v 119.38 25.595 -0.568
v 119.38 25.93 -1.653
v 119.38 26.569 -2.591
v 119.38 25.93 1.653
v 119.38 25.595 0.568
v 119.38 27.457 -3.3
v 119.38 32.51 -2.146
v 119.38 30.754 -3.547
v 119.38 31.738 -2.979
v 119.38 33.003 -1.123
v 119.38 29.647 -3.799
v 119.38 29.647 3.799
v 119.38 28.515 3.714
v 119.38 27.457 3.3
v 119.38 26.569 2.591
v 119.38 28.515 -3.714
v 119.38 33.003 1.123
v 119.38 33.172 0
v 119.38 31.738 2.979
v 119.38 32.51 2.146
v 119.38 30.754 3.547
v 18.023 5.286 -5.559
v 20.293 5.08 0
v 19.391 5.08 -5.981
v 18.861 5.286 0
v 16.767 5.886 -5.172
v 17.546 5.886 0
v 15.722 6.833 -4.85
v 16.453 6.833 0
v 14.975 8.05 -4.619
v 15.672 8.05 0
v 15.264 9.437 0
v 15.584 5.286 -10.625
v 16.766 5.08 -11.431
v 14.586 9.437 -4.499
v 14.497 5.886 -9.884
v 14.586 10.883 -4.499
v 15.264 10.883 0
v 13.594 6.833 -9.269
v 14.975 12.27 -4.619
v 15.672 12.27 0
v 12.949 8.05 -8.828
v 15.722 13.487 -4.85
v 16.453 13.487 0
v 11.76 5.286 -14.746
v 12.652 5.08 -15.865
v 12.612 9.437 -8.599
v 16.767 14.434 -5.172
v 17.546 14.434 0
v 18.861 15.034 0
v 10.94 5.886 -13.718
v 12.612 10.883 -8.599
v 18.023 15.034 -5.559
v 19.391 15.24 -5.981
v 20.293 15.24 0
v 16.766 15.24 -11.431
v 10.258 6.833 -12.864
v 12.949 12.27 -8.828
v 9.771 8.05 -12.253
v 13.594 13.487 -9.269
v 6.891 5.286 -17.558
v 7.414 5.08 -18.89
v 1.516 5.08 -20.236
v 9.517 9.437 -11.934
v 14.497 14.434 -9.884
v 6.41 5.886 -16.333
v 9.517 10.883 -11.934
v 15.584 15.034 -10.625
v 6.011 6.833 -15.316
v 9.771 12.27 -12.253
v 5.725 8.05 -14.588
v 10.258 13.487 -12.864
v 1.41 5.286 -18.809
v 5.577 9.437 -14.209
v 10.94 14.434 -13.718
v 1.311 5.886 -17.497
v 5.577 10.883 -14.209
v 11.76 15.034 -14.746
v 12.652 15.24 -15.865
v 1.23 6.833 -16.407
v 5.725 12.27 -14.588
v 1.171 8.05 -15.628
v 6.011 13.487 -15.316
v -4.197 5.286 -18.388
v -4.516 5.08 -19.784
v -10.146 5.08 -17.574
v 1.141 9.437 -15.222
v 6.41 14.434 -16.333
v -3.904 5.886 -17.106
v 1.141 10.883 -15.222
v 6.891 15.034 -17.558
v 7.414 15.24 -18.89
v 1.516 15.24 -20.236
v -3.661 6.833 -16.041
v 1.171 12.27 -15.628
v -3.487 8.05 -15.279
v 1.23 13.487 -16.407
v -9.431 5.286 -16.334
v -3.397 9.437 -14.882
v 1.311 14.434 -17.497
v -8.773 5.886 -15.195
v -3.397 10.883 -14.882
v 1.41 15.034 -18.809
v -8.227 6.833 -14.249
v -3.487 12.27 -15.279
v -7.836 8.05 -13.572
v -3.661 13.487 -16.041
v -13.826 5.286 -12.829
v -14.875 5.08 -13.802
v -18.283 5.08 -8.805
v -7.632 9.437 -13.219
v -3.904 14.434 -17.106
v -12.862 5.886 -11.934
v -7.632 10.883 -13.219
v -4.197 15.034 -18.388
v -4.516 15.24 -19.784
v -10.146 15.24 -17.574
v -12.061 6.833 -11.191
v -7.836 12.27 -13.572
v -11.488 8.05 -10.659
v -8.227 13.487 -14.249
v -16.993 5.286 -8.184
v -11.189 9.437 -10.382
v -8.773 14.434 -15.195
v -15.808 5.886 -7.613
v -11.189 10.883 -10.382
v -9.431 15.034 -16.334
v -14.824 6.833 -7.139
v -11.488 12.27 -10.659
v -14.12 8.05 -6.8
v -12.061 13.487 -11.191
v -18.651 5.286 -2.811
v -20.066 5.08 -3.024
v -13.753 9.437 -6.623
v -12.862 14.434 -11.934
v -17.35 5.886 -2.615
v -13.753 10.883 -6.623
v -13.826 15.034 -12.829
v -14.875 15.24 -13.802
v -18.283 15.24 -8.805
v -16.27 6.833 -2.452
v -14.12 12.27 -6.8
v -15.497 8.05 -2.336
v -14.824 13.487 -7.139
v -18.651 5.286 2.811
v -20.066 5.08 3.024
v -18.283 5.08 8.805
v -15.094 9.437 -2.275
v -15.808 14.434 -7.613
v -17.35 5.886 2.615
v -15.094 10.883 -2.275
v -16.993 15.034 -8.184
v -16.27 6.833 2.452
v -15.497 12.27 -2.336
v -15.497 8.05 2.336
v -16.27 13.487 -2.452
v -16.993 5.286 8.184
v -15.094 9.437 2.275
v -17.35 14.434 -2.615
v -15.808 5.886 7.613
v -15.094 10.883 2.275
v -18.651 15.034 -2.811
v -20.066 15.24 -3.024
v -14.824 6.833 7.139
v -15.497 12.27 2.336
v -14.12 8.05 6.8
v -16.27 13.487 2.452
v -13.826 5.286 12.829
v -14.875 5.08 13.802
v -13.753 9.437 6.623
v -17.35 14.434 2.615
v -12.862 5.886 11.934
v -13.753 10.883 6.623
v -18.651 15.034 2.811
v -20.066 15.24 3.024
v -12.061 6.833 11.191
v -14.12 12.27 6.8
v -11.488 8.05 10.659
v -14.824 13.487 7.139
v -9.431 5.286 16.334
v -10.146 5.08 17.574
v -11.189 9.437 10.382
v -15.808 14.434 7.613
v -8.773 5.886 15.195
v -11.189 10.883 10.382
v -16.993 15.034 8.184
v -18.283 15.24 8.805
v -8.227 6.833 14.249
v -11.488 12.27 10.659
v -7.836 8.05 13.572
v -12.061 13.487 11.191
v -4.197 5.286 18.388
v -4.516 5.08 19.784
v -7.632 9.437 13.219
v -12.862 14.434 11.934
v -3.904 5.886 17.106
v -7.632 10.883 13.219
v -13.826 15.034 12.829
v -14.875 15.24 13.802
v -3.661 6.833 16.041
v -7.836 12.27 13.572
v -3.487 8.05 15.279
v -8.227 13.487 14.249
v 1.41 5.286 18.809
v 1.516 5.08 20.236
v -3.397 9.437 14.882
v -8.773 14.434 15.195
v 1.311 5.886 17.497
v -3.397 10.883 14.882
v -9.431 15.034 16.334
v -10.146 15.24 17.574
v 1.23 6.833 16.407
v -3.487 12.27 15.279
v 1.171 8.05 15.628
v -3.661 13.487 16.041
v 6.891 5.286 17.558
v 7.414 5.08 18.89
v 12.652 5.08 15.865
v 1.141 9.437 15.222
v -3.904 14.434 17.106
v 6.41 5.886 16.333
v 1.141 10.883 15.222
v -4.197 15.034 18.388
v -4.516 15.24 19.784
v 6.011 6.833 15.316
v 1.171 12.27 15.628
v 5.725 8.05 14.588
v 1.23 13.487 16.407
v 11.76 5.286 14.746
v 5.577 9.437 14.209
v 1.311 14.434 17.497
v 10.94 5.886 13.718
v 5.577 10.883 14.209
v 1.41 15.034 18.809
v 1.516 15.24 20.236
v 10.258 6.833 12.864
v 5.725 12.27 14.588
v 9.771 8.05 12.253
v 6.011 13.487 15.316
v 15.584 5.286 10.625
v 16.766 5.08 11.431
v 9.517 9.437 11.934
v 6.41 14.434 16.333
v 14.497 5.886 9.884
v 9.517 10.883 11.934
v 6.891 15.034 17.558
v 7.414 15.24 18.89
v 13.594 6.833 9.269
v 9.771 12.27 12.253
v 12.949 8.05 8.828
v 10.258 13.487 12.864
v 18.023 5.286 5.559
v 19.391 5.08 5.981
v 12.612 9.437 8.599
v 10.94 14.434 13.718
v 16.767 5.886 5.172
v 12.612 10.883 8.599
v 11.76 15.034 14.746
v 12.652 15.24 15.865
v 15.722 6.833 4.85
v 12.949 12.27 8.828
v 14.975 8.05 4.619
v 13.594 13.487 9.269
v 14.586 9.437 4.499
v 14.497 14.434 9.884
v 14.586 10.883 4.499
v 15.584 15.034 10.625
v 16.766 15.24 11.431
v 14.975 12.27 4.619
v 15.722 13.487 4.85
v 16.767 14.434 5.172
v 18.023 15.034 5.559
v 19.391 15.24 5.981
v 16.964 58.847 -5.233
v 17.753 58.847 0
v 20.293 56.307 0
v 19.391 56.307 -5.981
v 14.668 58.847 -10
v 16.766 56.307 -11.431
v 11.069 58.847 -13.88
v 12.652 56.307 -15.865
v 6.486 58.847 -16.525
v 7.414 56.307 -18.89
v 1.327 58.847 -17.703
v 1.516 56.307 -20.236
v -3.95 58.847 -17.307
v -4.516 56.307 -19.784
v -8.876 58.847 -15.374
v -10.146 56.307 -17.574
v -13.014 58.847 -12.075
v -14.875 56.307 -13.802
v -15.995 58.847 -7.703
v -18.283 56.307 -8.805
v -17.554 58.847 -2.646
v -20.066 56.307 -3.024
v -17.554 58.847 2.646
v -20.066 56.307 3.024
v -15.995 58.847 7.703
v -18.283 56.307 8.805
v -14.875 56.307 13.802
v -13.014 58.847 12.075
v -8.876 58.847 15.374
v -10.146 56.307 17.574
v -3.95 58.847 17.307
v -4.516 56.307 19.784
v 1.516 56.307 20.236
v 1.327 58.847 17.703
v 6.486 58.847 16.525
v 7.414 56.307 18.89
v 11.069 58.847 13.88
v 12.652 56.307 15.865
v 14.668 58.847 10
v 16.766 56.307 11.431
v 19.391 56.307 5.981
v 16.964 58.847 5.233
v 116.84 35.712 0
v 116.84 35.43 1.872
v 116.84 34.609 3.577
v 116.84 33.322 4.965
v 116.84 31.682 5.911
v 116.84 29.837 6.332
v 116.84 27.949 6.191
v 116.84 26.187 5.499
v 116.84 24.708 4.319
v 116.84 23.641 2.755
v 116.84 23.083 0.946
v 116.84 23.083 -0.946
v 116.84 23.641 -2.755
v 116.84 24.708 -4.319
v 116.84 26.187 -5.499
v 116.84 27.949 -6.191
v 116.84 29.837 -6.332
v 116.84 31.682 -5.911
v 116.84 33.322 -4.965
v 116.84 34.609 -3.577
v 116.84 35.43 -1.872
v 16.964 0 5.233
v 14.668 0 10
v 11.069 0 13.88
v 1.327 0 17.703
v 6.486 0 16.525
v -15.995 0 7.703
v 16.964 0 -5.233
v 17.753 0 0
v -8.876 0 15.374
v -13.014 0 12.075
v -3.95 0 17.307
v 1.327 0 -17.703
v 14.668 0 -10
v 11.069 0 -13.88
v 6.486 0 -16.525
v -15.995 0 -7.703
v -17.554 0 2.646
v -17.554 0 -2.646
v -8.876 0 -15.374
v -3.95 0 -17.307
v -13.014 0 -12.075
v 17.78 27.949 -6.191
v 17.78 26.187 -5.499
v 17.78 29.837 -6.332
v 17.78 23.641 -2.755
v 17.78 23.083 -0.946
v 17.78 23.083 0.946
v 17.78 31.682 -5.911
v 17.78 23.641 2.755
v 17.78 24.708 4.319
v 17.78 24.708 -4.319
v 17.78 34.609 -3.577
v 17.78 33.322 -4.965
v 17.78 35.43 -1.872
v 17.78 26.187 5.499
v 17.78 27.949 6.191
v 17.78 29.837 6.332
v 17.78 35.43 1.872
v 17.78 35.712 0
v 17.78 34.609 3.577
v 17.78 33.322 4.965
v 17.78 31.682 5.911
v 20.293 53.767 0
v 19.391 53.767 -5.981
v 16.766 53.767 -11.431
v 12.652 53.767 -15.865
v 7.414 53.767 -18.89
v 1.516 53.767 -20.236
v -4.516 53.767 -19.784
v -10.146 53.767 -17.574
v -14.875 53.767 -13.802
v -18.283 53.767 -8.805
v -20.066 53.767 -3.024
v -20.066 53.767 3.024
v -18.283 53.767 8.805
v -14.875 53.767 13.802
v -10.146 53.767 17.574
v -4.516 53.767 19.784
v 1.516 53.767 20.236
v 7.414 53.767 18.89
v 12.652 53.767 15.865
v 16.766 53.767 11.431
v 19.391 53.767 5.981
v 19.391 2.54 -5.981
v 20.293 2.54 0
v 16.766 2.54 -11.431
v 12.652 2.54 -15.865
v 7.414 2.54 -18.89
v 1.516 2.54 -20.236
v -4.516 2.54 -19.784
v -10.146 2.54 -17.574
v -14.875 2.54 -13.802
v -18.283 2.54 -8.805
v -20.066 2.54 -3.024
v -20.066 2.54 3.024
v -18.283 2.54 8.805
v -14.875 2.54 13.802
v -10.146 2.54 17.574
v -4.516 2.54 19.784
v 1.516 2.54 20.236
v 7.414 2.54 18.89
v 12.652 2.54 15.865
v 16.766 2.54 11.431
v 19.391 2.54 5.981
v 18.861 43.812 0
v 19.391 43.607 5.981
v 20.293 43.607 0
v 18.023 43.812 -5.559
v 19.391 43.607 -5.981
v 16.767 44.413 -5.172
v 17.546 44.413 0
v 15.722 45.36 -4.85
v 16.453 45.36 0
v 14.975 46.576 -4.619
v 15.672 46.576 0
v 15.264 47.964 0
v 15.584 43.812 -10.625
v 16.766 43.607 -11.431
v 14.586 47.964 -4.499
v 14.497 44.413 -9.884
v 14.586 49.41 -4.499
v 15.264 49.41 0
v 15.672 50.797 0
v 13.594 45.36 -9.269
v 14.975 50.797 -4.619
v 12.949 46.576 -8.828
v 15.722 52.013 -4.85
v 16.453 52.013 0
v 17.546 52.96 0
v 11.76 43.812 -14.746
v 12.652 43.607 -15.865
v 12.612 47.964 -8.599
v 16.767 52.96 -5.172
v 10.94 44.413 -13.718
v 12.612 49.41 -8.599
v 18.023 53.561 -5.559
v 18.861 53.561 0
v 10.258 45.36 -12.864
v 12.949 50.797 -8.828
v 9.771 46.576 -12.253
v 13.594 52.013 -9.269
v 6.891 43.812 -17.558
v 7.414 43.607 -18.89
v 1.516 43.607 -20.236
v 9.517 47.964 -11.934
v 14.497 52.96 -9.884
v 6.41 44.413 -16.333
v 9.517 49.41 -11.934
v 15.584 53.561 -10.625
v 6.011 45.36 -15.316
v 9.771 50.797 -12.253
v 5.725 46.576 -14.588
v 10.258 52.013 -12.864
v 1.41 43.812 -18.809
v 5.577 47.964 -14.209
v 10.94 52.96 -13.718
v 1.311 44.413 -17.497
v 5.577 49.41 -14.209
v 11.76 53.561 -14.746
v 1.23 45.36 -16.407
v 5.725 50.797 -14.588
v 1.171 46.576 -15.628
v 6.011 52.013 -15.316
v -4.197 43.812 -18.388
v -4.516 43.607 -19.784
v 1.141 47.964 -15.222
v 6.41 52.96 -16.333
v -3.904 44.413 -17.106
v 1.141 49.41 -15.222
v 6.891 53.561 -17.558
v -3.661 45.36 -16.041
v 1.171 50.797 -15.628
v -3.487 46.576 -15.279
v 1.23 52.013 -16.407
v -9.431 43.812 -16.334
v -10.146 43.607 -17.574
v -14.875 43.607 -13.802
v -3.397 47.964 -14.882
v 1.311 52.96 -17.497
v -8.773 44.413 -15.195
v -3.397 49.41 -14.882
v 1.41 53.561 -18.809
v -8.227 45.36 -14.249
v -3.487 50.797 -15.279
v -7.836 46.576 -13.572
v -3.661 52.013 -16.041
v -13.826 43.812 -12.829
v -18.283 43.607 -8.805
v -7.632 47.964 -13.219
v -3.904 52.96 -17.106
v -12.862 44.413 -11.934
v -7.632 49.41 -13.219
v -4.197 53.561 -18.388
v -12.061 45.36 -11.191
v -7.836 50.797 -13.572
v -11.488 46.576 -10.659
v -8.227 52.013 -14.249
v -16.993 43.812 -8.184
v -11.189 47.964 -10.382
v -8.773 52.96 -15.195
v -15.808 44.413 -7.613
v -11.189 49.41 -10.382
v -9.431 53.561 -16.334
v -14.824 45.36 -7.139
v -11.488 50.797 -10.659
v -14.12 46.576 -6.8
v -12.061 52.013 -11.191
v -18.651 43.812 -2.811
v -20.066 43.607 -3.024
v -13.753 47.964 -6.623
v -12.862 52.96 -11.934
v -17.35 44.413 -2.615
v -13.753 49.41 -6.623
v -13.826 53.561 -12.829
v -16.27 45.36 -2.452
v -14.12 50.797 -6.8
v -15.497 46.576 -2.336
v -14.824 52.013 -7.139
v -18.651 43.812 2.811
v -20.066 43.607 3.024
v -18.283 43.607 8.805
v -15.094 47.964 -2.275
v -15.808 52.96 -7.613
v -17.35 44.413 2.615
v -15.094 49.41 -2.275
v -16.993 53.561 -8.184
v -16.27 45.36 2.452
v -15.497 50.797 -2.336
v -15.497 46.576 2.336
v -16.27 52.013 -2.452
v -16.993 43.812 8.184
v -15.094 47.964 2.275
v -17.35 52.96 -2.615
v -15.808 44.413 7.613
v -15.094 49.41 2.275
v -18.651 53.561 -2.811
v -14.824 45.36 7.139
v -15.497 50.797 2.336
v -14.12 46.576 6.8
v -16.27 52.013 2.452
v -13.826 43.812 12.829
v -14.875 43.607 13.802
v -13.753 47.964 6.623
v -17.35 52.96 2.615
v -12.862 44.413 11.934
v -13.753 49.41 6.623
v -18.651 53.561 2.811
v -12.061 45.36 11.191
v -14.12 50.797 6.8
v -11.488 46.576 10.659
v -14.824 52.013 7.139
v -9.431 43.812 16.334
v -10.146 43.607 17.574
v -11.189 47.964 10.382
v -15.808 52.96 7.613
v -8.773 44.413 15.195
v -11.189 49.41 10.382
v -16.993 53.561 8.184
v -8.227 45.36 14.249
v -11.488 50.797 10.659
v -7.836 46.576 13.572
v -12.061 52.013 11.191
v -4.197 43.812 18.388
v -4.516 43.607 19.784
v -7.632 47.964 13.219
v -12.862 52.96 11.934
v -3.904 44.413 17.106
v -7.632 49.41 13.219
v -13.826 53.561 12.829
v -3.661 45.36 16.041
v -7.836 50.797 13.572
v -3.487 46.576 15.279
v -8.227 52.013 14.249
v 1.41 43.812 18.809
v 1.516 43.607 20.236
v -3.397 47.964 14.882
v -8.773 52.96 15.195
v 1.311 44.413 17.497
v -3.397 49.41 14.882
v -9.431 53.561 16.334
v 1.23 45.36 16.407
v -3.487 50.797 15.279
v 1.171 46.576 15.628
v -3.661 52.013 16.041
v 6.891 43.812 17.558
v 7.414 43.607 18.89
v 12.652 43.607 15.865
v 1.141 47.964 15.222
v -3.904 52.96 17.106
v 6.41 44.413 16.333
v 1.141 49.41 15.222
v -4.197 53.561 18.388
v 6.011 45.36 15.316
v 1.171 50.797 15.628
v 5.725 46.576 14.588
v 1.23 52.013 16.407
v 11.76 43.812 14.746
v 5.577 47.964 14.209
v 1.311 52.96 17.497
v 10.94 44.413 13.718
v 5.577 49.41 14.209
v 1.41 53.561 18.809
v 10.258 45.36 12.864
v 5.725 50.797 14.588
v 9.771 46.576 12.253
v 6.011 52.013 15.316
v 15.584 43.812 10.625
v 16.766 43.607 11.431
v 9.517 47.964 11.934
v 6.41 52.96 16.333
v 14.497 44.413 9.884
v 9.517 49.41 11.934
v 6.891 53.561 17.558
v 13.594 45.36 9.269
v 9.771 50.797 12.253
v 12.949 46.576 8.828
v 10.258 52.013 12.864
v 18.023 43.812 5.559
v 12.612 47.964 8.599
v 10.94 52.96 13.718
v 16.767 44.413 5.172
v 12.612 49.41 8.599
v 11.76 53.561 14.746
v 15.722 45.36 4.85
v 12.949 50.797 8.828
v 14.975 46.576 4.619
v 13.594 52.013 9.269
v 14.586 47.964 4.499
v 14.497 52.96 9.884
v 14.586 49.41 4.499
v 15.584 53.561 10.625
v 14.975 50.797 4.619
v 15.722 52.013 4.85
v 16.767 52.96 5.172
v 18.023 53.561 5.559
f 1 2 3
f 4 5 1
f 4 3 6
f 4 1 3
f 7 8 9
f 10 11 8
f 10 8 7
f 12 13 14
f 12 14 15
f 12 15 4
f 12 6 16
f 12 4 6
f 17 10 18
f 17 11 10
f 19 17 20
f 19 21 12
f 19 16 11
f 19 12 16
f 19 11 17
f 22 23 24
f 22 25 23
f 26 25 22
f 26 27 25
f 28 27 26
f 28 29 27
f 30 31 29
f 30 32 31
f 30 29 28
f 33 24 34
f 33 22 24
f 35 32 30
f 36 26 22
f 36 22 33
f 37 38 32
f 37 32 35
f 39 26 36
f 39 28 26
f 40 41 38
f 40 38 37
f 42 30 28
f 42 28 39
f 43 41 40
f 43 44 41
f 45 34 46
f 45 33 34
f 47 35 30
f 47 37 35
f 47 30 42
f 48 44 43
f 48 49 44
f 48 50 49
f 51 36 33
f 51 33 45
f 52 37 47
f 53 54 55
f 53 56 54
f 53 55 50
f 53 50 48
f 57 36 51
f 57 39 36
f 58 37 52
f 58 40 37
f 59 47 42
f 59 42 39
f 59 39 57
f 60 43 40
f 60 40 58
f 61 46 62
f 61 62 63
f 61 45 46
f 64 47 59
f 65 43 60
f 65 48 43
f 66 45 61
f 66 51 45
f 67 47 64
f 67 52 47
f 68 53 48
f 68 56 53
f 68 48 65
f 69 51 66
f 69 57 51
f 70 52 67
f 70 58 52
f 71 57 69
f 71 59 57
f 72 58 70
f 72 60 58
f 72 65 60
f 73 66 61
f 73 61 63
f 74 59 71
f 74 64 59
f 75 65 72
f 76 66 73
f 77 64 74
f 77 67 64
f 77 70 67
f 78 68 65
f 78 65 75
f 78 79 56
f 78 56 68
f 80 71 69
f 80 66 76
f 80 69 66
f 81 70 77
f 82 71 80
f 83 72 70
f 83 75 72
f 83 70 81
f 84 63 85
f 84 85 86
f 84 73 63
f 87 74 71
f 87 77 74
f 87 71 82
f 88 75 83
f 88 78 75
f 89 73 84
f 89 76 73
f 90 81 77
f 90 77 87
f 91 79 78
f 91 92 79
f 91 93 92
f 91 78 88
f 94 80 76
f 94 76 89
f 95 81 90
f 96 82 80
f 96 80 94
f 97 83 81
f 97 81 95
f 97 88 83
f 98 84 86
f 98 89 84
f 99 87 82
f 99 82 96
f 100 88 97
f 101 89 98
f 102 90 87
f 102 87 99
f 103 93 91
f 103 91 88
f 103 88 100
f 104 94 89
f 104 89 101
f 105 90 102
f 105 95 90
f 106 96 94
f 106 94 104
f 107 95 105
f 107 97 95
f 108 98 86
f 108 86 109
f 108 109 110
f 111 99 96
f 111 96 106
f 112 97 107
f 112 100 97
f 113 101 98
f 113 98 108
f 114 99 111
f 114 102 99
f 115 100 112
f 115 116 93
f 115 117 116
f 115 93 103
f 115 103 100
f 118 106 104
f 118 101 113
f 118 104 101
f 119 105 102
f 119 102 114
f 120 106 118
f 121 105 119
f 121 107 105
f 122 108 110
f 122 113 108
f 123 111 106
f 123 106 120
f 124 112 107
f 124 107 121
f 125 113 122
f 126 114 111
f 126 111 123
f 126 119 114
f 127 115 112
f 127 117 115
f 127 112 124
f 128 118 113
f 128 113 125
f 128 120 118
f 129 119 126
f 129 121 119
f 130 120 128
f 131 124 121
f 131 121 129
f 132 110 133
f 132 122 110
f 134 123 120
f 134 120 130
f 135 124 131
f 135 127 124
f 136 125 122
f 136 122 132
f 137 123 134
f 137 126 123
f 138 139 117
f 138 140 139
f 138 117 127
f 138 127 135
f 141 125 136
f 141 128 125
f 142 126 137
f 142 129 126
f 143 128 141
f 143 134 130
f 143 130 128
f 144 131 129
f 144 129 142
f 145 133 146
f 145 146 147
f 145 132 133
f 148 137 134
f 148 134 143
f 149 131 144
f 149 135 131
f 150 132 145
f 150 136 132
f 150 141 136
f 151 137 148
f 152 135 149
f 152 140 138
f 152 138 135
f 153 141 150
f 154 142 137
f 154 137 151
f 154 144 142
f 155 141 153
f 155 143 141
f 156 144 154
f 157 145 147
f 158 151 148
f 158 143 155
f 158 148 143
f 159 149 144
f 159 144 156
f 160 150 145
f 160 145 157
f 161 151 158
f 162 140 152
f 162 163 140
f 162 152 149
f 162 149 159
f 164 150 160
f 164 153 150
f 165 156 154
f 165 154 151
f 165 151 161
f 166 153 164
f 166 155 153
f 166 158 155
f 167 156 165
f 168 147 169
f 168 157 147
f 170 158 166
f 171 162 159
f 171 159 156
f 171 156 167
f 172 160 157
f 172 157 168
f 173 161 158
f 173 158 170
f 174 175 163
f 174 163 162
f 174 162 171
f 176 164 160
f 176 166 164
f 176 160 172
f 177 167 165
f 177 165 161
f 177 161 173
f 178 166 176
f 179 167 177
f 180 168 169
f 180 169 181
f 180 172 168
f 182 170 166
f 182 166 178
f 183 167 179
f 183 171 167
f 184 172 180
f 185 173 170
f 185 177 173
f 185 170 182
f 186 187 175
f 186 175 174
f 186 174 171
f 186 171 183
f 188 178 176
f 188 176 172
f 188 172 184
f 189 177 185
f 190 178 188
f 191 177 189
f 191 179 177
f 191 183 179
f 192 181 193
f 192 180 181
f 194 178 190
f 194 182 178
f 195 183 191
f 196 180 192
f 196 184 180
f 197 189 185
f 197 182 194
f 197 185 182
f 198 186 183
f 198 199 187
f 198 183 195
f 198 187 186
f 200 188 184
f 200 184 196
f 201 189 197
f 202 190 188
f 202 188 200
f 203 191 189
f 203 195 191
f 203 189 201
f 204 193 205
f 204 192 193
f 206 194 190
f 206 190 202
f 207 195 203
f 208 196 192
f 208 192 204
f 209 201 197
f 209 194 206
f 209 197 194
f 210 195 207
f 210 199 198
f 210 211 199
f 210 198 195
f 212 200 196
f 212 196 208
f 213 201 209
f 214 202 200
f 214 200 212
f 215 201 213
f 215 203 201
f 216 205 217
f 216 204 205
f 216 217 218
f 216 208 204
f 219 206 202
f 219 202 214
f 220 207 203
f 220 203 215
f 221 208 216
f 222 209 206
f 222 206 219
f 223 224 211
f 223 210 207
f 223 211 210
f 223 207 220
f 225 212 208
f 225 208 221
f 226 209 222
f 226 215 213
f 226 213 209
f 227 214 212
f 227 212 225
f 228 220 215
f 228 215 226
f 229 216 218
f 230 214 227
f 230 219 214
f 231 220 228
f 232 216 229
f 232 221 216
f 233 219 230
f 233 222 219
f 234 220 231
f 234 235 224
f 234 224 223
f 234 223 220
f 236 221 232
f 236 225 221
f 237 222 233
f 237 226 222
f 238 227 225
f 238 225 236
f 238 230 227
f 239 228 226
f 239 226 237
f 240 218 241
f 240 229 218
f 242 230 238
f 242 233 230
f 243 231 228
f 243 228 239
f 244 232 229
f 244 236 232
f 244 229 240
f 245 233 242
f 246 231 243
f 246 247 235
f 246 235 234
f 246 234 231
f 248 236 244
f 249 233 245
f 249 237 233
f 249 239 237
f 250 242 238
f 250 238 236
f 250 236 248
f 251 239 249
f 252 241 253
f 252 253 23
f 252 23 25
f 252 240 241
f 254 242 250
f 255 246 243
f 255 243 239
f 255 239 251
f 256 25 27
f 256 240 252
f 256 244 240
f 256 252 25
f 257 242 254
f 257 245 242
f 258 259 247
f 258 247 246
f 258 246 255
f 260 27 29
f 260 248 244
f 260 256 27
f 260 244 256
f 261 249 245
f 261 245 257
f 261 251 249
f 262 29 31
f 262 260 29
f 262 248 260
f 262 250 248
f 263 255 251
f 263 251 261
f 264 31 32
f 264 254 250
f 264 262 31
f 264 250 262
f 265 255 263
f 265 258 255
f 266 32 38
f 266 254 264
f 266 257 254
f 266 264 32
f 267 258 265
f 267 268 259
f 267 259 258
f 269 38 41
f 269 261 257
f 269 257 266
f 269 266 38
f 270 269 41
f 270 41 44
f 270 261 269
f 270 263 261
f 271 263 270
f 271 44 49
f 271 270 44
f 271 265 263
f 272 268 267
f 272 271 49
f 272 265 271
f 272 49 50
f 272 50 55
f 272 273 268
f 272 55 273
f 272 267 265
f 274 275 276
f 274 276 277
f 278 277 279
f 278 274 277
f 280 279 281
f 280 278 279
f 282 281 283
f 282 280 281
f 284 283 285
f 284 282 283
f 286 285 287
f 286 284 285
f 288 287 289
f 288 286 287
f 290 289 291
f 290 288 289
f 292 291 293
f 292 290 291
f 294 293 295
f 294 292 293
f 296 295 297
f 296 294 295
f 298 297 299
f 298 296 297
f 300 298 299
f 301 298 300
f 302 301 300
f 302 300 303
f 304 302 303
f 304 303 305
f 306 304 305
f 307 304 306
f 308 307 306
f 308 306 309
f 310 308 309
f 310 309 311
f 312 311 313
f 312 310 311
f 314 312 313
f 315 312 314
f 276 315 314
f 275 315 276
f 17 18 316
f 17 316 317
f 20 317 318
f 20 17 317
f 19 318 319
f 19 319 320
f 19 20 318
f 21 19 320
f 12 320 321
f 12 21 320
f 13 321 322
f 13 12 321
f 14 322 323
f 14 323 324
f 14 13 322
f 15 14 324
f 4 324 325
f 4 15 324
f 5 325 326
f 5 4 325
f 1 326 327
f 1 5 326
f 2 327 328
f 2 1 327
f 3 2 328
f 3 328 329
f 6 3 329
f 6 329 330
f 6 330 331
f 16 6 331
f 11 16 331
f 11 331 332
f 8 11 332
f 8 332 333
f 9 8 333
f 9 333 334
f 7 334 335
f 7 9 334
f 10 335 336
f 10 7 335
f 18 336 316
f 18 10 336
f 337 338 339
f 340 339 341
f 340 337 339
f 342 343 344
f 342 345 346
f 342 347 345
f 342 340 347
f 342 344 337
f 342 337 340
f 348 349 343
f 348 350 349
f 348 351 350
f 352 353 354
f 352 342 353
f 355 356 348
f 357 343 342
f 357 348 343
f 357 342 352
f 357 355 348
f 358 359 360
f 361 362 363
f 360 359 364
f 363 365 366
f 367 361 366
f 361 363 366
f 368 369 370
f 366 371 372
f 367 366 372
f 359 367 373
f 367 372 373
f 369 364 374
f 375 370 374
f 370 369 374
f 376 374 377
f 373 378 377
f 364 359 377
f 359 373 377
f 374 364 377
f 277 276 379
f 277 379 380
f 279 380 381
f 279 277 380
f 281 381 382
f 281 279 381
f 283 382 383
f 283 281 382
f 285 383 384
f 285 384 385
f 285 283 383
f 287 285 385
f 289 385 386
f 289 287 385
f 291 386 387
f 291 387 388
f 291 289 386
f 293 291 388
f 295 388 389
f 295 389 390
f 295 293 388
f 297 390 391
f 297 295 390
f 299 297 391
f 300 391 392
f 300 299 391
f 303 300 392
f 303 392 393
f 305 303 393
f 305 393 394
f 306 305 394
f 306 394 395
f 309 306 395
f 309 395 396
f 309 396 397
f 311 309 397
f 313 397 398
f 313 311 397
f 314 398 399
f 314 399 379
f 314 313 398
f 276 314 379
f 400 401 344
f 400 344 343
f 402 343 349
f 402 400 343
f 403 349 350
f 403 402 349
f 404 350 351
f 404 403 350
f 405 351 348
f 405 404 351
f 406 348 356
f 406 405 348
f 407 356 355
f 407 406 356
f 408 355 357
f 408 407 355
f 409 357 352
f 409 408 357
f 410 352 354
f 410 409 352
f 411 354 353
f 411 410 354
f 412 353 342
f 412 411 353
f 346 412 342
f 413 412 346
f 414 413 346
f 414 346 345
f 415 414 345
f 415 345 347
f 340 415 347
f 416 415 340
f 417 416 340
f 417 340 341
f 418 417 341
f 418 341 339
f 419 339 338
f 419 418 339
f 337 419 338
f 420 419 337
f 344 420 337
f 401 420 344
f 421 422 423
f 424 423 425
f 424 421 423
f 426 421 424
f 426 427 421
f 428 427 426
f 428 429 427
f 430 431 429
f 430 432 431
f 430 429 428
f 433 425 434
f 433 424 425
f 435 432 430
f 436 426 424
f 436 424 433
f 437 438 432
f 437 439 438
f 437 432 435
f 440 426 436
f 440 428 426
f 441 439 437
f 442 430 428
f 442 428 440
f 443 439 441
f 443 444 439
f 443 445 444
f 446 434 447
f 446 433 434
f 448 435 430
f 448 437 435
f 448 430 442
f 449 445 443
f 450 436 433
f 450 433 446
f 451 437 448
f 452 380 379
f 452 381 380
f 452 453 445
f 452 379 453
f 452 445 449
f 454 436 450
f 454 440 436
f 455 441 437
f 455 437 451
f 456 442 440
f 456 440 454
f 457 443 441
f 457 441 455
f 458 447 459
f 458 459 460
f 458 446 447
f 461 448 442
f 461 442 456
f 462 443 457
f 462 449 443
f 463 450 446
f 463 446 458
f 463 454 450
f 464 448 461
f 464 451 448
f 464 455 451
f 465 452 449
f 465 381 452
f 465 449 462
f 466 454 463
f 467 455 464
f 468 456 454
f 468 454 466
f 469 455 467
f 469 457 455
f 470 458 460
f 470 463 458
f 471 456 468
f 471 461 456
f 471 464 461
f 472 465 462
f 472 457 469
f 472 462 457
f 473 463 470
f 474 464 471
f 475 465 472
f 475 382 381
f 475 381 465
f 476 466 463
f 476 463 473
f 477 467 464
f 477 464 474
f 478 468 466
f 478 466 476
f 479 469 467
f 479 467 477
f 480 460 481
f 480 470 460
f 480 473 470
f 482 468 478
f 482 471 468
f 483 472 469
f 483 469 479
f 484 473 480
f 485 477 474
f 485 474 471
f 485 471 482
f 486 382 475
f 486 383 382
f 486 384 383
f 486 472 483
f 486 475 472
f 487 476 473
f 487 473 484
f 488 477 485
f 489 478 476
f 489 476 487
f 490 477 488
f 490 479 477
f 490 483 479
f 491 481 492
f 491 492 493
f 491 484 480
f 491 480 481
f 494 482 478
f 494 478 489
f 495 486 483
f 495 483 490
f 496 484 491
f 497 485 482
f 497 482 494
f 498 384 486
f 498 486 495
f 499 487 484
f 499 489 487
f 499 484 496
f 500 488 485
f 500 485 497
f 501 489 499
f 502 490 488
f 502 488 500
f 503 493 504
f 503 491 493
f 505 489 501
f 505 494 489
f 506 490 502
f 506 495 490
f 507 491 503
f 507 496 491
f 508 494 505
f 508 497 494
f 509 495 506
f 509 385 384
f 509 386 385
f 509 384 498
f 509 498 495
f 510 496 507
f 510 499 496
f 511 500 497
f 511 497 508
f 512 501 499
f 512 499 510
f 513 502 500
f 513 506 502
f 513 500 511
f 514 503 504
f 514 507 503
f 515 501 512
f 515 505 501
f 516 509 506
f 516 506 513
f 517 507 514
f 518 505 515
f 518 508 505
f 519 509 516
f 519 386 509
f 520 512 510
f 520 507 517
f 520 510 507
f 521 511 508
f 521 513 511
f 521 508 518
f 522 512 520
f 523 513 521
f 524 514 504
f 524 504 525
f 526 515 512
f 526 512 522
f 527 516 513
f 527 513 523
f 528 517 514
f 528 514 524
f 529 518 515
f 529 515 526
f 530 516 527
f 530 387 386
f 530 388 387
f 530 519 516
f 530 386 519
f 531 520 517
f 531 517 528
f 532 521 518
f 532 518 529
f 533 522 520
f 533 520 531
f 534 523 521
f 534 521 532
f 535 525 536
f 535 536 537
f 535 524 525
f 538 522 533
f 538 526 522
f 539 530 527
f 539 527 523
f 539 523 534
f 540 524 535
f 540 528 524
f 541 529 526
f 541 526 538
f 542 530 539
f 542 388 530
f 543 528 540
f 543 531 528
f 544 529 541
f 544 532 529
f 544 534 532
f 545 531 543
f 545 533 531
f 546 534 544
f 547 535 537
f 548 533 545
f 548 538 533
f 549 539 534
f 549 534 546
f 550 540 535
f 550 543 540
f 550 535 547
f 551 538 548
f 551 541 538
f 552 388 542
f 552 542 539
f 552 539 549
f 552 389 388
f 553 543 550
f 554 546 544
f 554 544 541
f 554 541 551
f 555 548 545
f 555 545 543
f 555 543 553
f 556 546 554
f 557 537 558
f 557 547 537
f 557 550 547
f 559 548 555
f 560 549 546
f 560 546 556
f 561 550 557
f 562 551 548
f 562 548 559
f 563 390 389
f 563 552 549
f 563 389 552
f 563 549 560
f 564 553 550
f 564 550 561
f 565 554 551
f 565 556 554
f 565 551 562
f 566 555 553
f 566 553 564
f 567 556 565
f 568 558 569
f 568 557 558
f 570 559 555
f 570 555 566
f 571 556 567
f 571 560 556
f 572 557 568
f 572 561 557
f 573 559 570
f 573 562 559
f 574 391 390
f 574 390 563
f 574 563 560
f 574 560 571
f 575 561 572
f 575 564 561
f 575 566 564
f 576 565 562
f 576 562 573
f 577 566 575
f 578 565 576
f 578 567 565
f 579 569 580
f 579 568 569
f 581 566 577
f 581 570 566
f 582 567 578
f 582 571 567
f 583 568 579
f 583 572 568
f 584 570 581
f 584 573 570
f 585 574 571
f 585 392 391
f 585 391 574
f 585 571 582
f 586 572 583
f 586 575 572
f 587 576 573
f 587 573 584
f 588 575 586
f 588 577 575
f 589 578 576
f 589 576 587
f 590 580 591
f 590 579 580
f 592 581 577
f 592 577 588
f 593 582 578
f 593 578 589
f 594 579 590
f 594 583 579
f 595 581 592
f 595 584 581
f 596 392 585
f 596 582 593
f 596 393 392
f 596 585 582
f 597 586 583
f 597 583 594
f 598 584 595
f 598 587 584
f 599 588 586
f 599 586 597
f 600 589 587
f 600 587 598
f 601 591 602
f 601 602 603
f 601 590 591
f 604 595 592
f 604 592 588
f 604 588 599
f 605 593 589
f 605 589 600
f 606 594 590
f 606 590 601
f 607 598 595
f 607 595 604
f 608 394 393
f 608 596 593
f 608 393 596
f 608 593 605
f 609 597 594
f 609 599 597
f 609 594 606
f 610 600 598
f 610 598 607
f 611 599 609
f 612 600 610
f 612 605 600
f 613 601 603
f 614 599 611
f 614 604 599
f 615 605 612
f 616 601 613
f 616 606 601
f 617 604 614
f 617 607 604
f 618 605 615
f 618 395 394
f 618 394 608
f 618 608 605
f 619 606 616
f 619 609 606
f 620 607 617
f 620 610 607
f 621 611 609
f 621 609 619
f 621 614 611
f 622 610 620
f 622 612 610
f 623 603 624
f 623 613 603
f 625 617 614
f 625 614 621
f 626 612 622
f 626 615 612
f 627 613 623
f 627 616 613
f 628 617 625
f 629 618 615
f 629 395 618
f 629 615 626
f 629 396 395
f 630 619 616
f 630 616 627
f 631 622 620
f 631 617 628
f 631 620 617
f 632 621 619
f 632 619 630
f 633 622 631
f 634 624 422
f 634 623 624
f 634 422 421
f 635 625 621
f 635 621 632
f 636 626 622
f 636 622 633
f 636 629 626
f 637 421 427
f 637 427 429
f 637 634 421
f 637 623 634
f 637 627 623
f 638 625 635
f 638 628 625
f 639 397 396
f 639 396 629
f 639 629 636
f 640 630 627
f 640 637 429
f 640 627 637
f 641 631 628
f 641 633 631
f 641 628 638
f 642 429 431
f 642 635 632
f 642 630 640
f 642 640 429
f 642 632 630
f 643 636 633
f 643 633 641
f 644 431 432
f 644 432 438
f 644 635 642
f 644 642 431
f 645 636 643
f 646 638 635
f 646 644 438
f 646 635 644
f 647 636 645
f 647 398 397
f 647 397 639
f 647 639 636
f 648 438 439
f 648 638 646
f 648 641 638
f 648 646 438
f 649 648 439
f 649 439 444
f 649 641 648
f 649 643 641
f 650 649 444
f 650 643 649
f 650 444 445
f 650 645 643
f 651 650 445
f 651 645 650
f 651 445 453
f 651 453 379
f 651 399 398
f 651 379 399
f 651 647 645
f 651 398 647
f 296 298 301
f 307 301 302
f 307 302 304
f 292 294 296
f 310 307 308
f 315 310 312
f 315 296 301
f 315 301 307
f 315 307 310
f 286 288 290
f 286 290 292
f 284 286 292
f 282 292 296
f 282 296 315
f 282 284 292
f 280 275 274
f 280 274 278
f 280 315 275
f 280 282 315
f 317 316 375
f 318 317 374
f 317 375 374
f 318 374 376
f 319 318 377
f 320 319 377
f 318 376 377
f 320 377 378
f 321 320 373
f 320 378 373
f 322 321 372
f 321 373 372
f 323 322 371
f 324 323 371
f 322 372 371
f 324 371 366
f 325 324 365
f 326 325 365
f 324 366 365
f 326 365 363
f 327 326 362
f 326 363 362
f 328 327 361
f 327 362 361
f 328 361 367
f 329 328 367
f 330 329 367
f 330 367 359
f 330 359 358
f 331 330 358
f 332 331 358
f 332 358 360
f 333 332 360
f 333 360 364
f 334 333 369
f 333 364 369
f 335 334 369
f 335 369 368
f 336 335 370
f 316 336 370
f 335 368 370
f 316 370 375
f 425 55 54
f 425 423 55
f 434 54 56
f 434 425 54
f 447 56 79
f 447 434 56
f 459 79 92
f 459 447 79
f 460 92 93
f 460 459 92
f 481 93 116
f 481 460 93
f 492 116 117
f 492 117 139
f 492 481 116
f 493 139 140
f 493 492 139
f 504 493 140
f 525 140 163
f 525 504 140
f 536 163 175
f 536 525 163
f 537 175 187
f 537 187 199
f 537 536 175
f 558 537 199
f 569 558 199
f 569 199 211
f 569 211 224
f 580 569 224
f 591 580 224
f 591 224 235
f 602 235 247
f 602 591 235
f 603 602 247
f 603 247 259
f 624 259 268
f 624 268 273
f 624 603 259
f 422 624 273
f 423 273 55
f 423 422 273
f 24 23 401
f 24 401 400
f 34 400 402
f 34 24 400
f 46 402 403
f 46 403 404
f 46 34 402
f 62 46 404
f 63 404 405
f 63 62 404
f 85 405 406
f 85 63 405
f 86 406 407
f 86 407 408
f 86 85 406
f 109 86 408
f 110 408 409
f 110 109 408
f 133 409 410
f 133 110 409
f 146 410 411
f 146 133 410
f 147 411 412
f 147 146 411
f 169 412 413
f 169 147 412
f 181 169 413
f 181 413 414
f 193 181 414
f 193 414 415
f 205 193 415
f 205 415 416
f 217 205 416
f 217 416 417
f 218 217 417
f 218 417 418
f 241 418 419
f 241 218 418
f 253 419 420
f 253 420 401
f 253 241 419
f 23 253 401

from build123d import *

# Parameters (mm, degrees)
F3_R      = 6.35
F4_DEPTH  = 101.6
F5_SIZE   = 2.54
F5_2_SIZE = 2.54


with BuildPart() as f1:
    # F0 (on Top) → F1 (revolve)
    with BuildSketch(Plane.XY):
        with BuildLine():
            Line((0, 58.846702), (0, 0))
            Line((0, 0), (20.292558, 0))
            Line((20.292558, 0), (20.292558, 5.08))
            ThreePointArc((20.292558, 5.08), (15.212558, 10.16), (20.292558, 15.24))
            Line((20.292558, 15.24), (20.292558, 43.606702))
            ThreePointArc((20.292558, 43.606702), (15.212558, 48.686702), (20.292558, 53.766702))
            Line((20.292558, 53.766702), (20.292558, 58.846702))
            Line((20.292558, 58.846702), (0, 58.846702))
        make_face()
    revolve(axis=Axis((0, 29.423351, 0), (0, 1, 0)))

    # F5
    f5_edges = [f1.edges().sort_by_distance(p)[0] for p in [
        (-20.292558, 0, 0),
        (-20.292558, 58.846702, 0),
    ]]
    chamfer(f5_edges, length=F5_SIZE)


with BuildPart() as f4:
    # F3 (on offset) → F4 (new body)
    with BuildSketch(Plane.YZ.offset(17.78)):
        with Locations((29.3624, 0)):
            Circle(F3_R)
    extrude(amount=F4_DEPTH)

    # F5#2
    f5_2_edges = [f4.edges().sort_by_distance(p)[0] for p in [
        (119.38, 23.0124, 0),
    ]]
    chamfer(f5_2_edges, length=F5_2_SIZE)


solid = Compound([f1.part, f4.part])
